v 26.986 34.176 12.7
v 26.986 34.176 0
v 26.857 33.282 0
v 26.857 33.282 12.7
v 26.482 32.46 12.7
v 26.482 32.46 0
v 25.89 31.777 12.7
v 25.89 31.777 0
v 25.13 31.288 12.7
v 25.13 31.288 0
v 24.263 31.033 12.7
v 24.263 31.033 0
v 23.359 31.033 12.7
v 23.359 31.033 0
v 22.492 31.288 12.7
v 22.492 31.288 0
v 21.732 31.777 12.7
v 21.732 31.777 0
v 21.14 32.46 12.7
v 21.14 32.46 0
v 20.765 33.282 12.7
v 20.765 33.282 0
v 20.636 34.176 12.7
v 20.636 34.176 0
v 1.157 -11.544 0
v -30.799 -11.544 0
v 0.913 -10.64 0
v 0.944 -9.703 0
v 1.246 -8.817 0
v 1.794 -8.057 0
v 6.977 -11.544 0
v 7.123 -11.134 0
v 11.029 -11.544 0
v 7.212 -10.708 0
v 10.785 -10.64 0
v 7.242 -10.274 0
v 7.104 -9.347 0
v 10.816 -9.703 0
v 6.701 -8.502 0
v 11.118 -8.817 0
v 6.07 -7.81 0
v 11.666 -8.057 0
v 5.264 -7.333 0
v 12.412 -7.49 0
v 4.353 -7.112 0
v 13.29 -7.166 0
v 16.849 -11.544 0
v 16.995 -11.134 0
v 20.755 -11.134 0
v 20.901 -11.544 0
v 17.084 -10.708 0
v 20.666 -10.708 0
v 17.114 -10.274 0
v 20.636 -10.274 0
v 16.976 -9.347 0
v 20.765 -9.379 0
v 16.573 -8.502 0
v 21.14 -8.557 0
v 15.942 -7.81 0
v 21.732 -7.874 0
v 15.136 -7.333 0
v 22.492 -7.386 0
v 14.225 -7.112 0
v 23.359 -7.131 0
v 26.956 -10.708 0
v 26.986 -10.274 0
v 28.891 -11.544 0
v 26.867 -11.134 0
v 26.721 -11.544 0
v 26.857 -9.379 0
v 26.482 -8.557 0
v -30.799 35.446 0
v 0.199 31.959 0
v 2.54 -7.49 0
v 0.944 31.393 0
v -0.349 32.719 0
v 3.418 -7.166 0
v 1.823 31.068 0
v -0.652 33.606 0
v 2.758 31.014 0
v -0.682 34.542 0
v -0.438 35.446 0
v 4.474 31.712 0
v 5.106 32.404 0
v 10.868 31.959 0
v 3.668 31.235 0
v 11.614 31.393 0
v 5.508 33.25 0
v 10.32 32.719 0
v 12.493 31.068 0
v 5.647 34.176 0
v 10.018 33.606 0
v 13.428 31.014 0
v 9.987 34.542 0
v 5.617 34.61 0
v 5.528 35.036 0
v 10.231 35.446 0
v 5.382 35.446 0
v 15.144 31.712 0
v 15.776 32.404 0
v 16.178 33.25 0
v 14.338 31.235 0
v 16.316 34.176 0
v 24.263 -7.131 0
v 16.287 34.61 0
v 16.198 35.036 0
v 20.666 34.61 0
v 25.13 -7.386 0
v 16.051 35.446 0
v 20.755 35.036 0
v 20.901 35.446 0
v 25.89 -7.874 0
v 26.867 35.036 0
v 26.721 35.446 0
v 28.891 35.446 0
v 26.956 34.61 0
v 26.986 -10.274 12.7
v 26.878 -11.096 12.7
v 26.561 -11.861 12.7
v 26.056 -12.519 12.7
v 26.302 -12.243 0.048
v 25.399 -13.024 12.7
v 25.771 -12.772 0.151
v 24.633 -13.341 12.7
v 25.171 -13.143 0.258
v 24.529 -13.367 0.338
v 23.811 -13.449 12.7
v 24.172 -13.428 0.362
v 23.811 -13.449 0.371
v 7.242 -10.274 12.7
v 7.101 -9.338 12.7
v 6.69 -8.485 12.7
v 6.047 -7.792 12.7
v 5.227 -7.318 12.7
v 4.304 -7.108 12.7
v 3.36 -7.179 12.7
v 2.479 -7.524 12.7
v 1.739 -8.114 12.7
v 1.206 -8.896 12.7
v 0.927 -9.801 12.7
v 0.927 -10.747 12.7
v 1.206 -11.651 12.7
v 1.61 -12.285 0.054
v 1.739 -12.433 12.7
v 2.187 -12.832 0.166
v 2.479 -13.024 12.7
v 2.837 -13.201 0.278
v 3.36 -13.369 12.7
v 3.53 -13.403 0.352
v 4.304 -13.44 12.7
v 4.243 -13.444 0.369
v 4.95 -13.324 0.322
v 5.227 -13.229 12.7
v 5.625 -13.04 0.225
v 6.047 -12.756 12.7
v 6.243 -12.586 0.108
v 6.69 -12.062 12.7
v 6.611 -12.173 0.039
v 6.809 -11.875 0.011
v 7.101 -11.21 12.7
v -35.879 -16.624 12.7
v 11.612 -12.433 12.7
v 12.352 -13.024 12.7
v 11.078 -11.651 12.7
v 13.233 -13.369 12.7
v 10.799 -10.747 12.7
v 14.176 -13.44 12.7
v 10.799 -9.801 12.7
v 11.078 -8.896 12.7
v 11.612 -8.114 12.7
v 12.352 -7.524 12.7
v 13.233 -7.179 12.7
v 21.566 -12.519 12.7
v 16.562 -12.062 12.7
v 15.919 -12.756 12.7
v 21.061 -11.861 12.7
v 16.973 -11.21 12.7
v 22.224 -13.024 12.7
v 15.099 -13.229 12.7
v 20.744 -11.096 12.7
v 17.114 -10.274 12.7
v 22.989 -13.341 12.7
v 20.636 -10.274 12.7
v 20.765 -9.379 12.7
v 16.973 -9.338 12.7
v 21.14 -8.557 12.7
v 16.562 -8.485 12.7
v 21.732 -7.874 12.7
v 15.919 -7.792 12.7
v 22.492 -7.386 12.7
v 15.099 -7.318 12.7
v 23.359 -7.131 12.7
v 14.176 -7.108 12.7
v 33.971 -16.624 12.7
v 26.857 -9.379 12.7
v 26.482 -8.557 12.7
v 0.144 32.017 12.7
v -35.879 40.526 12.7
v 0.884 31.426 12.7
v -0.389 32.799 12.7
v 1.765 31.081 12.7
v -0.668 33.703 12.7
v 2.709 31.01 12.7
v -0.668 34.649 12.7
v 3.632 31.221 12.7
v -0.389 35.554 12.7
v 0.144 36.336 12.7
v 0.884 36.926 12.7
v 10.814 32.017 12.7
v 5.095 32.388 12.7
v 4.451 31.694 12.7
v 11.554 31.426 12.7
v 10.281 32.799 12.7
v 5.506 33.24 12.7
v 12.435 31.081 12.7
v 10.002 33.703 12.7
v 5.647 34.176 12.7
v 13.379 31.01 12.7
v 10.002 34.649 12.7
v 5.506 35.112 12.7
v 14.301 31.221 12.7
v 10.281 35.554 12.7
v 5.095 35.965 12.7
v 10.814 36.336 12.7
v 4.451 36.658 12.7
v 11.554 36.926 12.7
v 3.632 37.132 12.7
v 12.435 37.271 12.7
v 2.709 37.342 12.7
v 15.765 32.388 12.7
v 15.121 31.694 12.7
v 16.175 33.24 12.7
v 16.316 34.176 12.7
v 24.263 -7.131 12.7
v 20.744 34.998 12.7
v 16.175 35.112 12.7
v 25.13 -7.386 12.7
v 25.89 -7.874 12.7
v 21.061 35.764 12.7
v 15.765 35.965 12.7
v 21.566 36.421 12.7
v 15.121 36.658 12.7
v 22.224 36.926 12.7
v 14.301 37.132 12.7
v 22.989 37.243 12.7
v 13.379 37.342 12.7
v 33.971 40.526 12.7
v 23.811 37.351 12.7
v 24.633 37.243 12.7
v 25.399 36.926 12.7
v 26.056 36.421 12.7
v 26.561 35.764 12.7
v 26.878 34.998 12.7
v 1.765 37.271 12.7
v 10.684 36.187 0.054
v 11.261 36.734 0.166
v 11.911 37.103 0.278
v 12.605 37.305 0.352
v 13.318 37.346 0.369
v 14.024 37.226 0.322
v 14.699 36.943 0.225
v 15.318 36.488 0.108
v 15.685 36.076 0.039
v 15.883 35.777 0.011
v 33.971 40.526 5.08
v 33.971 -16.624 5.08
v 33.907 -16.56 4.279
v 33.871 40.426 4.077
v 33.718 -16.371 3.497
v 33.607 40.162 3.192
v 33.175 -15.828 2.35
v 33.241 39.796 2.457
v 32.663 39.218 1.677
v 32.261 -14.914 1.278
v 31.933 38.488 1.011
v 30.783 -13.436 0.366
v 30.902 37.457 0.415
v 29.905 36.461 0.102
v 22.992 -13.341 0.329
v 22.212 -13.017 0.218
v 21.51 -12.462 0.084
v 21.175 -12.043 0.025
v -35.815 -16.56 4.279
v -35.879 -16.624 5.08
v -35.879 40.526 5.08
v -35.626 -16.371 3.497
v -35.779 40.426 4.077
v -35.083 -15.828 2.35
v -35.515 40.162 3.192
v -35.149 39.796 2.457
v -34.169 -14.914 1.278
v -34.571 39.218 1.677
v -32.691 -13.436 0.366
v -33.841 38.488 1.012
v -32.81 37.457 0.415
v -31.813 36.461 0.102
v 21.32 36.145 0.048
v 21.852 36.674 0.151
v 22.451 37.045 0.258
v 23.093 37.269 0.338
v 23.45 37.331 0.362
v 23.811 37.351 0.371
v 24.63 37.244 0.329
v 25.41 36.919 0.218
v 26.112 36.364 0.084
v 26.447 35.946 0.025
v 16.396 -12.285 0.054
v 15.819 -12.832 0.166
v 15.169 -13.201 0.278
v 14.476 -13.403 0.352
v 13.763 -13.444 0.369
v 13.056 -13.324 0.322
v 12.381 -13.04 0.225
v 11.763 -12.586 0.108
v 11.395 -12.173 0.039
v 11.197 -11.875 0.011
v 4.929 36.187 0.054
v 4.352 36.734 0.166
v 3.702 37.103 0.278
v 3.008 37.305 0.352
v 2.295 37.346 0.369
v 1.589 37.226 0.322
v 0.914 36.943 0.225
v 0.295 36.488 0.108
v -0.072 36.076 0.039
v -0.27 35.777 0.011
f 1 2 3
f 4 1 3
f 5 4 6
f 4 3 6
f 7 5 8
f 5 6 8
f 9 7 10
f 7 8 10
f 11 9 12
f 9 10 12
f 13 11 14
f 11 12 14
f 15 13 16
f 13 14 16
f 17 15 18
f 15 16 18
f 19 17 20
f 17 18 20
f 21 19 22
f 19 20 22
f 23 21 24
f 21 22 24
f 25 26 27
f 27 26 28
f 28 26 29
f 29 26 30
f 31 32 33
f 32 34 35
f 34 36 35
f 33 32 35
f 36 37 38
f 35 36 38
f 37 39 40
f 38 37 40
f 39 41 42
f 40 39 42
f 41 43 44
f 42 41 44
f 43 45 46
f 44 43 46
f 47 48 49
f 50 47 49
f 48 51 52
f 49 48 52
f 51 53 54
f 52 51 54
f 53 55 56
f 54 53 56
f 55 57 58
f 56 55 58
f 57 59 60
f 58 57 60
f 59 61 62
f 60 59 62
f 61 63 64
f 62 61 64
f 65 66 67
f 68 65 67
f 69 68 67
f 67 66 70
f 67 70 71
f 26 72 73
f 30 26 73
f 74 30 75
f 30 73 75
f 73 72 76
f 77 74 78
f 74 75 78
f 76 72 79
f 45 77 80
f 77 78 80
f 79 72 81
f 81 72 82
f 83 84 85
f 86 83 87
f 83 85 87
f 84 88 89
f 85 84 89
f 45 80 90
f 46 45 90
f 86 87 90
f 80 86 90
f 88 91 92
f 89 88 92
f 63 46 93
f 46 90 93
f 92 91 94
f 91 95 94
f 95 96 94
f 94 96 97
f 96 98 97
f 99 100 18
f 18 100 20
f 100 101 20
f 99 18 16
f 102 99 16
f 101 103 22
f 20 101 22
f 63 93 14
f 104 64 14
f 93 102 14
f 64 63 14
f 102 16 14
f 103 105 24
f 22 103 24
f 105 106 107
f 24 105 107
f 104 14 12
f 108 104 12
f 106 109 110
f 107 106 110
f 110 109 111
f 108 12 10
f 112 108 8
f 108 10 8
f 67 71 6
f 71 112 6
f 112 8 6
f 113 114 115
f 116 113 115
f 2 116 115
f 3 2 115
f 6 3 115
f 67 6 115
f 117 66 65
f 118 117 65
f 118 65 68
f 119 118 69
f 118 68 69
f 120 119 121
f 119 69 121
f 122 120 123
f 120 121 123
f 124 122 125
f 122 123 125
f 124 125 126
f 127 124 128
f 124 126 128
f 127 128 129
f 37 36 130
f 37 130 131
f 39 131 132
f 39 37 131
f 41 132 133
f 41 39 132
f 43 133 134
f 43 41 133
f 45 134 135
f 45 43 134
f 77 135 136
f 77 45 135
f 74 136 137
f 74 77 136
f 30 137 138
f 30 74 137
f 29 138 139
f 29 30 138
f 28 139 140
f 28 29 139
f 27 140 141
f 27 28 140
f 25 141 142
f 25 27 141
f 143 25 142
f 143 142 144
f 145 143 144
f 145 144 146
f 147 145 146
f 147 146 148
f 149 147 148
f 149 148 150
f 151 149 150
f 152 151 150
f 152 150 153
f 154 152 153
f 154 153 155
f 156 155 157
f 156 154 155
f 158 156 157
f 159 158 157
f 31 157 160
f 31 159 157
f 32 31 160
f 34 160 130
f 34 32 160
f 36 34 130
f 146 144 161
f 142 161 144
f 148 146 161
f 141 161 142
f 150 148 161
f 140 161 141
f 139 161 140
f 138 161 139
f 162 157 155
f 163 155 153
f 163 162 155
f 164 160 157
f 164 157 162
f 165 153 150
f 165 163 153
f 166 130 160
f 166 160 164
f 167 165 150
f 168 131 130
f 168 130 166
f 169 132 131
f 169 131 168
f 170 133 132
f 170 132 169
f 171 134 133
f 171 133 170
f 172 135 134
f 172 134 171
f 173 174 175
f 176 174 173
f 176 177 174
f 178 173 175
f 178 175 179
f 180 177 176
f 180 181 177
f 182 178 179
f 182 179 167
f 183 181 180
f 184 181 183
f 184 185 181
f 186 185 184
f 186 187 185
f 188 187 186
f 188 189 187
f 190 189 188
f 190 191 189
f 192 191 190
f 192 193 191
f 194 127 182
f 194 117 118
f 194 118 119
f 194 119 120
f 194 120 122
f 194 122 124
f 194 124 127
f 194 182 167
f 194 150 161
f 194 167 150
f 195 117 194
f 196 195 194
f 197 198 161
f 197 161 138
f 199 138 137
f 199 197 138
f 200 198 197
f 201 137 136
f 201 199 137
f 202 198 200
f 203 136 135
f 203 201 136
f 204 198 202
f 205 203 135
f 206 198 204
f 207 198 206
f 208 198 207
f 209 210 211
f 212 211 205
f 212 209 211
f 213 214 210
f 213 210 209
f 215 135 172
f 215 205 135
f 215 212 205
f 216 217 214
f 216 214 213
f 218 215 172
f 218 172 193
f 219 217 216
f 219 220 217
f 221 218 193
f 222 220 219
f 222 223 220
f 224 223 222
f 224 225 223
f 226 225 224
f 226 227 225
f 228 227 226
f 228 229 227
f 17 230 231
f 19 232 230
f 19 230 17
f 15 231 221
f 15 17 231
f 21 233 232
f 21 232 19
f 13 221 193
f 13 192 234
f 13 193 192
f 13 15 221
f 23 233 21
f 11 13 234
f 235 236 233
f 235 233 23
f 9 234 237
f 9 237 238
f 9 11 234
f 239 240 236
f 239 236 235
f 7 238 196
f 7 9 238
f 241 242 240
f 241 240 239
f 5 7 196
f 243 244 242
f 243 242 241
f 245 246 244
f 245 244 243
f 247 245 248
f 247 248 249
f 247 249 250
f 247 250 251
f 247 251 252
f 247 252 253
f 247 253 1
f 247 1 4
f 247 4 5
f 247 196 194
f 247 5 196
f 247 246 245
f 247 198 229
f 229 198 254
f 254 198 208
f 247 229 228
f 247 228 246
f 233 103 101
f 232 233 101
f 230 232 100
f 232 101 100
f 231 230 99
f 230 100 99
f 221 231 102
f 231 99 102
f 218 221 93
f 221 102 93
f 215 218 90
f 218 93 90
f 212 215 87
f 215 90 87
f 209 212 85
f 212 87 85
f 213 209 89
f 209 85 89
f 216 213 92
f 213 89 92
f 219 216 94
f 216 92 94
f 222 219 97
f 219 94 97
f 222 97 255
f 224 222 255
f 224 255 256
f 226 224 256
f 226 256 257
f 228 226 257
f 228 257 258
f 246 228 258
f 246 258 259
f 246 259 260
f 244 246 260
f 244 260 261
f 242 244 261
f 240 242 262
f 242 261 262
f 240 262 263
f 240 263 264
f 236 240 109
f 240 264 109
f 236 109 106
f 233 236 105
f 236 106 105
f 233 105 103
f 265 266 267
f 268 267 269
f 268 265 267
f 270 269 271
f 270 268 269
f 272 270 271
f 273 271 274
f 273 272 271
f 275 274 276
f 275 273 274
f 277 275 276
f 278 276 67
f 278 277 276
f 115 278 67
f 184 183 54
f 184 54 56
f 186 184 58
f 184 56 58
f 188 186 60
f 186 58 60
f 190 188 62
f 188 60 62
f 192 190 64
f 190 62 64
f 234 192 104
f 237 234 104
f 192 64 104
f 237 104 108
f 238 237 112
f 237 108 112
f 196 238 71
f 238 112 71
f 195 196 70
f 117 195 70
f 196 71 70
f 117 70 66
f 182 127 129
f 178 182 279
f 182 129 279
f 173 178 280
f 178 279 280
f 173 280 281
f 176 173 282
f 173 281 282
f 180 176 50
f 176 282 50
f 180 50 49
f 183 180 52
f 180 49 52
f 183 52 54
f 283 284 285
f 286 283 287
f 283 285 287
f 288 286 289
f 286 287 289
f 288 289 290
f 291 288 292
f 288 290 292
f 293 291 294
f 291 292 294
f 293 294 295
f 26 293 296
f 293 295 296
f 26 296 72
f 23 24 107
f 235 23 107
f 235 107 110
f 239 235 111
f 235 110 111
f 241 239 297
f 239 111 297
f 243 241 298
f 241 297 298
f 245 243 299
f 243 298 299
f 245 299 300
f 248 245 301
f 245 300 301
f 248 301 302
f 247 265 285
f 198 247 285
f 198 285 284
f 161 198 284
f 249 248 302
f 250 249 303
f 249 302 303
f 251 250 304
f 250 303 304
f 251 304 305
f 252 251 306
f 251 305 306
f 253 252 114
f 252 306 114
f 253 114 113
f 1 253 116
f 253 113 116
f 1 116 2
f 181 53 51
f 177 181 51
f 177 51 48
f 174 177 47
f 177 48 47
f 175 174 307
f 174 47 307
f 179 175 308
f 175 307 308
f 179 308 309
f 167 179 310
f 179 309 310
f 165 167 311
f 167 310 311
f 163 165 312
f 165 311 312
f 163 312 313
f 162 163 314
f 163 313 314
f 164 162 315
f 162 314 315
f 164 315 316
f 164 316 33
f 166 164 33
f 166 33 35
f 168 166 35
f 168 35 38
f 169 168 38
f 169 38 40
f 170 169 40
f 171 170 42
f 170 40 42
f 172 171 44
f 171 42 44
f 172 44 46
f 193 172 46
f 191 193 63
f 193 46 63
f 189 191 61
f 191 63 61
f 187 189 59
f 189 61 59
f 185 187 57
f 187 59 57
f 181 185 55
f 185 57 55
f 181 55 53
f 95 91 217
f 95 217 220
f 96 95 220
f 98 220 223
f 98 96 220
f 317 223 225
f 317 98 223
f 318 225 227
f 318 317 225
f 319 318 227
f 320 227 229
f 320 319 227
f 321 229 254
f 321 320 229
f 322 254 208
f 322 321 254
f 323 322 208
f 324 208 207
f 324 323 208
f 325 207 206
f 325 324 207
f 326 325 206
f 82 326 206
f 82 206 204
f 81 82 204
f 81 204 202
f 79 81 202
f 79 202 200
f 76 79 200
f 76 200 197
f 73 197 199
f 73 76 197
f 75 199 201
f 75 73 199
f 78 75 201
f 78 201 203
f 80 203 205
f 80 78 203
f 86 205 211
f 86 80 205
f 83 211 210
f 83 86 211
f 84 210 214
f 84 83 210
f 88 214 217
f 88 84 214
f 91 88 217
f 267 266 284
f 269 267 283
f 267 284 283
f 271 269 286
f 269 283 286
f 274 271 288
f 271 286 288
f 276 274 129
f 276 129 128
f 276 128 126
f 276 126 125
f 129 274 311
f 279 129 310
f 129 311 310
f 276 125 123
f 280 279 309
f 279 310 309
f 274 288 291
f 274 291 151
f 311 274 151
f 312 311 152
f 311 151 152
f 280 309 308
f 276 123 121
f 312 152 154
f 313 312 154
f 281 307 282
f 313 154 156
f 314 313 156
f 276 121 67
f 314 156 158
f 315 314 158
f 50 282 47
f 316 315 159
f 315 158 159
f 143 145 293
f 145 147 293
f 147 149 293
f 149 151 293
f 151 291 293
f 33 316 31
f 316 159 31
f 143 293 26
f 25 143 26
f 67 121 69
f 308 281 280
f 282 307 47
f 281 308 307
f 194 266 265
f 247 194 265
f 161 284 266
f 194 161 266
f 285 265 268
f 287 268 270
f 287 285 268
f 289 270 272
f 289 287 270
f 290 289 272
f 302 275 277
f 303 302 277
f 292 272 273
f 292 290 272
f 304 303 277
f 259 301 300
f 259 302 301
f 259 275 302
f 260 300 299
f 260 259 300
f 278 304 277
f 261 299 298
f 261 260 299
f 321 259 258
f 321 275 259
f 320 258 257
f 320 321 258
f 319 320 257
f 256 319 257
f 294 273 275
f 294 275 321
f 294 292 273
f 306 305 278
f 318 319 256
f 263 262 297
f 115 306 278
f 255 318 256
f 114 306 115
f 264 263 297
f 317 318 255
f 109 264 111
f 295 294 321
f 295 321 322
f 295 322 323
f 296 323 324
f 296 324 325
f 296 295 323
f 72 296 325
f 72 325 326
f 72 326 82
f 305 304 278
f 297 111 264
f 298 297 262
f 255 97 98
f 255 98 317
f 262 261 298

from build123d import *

# Parameters (mm, degrees)
F0_R        = 3.175
F1_DEPTH    = 12.7
F2_T1_DEPTH = 95.25
F2_T3_DEPTH = 82.55


# Not quite as in the source:
# - a fillet or chamfer that OpenCascade refuses, or shapes differently, is made with other operations: its cross-section is extruded or revolved along the edge and cut away or added


with BuildPart() as f1:
    # F0 (on Top) → F1 (new body)
    with BuildSketch(Plane.XY):
        with BuildLine():
            Line((23.8110734844, 40.5260987967), (-35.8789265156, 40.5260987967))
            Line((-35.8789265156, 40.5260987967), (-35.8789265156, -16.6239012033))
            Line((-35.8789265156, -16.6239012033), (23.8110734844, -16.6239012033))
            Line((23.8110734844, -16.6239012033), (23.8110734844, -13.4489012033))
            ThreePointArc((23.8110734844, -13.4489012033), (21.5660094542, -12.5189652335), (20.6360734844, -10.2739012033))
            ThreePointArc((20.6360734844, -10.2739012033), (23.8110734844, -7.0989012033), (26.9860734844, -10.2739012033))
            Line((26.9860734844, -10.2739012033), (33.9710734844, -10.2739012033))
            Line((33.9710734844, -10.2739012033), (33.9710734844, 34.1760987967))
            Line((33.9710734844, 34.1760987967), (26.9860734844, 34.1760987967))
            ThreePointArc((26.9860734844, 34.1760987967), (23.8110734844, 31.0010987967), (20.6360734844, 34.1760987967))
            ThreePointArc((20.6360734844, 34.1760987967), (21.5660094542, 36.421162827), (23.8110734844, 37.3510987967))
            Line((23.8110734844, 37.3510987967), (23.8110734844, 40.5260987967))
        make_face()
        with Locations((4.0669361824, -10.2739012033)):
            Circle(F0_R, mode=Mode.SUBTRACT)
        with BuildLine():
            ThreePointArc((10.7640048334, -10.2739012033), (13.9390048334, -7.0989012033), (17.1140048334, -10.2739012033))
            ThreePointArc((17.1140048334, -10.2739012033), (13.9390048334, -13.4489012033), (10.7640048334, -10.2739012033))
        make_face(mode=Mode.SUBTRACT)
        with Locations((2.4716164917, 34.1760987967)):
            Circle(F0_R, mode=Mode.SUBTRACT)
        with BuildLine():
            ThreePointArc((9.966344988, 34.1760987967), (13.141344988, 37.3510987967), (16.316344988, 34.1760987967))
            ThreePointArc((16.316344988, 34.1760987967), (13.141344988, 31.0010987967), (9.966344988, 34.1760987967))
        make_face(mode=Mode.SUBTRACT)
        with BuildLine():
            Line((33.9710734844, 40.5260987967), (23.8110734844, 40.5260987967))
            Line((23.8110734844, 40.5260987967), (23.8110734844, 37.3510987967))
            ThreePointArc((23.8110734844, 37.3510987967), (26.0561375147, 36.421162827), (26.9860734844, 34.1760987967))
            Line((26.9860734844, 34.1760987967), (33.9710734844, 34.1760987967))
            Line((33.9710734844, 34.1760987967), (33.9710734844, 40.5260987967))
        make_face()
        with BuildLine():
            Line((23.8110734844, -13.4489012033), (23.8110734844, -16.6239012033))
            Line((23.8110734844, -16.6239012033), (33.9710734844, -16.6239012033))
            Line((33.9710734844, -16.6239012033), (33.9710734844, -10.2739012033))
            Line((33.9710734844, -10.2739012033), (26.9860734844, -10.2739012033))
            ThreePointArc((26.9860734844, -10.2739012033), (26.0561375147, -12.5189652335), (23.8110734844, -13.4489012033))
        make_face()
    extrude(amount=F1_DEPTH)

    # F2: fillet of radius 5.08 on 4 edges, made by hand

    # F2_s2 → F2_t1 (cut)
    with BuildSketch(Plane.YZ.offset(-48.5789265156)):
        with BuildLine():
            ThreePointArc((-16.6239012033, 5.08), (-15.1360036517, 1.4878975516), (-11.5439012033, 0))
            Line((-11.5439012033, 0), (-16.6239012033, 0))
            Line((-16.6239012033, 0), (-16.6239012033, 5.08))
        make_face()
        with BuildLine():
            ThreePointArc((40.5260987967, 5.08), (39.0382012452, 1.4878975516), (35.4460987967, 0))
            Line((35.4460987967, 0), (40.5260987967, 0))
            Line((40.5260987967, 0), (40.5260987967, 5.08))
        make_face()
    extrude(amount=F2_T1_DEPTH, mode=Mode.SUBTRACT)

    # F2_s4 → F2_t3 (cut)
    with BuildSketch(Plane.XZ.offset(-53.2260987967)):
        with BuildLine():
            ThreePointArc((33.9710734844, 5.08), (32.4831759328, 1.4878975516), (28.8910734844, 0))
            Line((28.8910734844, 0), (33.9710734844, 0))
            Line((33.9710734844, 0), (33.9710734844, 5.08))
        make_face()
        with BuildLine():
            ThreePointArc((-35.8789265156, 5.08), (-34.391028964, 1.4878975516), (-30.7989265156, 0))
            Line((-30.7989265156, 0), (-35.8789265156, 0))
            Line((-35.8789265156, 0), (-35.8789265156, 5.08))
        make_face()
    extrude(amount=F2_T3_DEPTH, mode=Mode.SUBTRACT)


solid = f1.part
